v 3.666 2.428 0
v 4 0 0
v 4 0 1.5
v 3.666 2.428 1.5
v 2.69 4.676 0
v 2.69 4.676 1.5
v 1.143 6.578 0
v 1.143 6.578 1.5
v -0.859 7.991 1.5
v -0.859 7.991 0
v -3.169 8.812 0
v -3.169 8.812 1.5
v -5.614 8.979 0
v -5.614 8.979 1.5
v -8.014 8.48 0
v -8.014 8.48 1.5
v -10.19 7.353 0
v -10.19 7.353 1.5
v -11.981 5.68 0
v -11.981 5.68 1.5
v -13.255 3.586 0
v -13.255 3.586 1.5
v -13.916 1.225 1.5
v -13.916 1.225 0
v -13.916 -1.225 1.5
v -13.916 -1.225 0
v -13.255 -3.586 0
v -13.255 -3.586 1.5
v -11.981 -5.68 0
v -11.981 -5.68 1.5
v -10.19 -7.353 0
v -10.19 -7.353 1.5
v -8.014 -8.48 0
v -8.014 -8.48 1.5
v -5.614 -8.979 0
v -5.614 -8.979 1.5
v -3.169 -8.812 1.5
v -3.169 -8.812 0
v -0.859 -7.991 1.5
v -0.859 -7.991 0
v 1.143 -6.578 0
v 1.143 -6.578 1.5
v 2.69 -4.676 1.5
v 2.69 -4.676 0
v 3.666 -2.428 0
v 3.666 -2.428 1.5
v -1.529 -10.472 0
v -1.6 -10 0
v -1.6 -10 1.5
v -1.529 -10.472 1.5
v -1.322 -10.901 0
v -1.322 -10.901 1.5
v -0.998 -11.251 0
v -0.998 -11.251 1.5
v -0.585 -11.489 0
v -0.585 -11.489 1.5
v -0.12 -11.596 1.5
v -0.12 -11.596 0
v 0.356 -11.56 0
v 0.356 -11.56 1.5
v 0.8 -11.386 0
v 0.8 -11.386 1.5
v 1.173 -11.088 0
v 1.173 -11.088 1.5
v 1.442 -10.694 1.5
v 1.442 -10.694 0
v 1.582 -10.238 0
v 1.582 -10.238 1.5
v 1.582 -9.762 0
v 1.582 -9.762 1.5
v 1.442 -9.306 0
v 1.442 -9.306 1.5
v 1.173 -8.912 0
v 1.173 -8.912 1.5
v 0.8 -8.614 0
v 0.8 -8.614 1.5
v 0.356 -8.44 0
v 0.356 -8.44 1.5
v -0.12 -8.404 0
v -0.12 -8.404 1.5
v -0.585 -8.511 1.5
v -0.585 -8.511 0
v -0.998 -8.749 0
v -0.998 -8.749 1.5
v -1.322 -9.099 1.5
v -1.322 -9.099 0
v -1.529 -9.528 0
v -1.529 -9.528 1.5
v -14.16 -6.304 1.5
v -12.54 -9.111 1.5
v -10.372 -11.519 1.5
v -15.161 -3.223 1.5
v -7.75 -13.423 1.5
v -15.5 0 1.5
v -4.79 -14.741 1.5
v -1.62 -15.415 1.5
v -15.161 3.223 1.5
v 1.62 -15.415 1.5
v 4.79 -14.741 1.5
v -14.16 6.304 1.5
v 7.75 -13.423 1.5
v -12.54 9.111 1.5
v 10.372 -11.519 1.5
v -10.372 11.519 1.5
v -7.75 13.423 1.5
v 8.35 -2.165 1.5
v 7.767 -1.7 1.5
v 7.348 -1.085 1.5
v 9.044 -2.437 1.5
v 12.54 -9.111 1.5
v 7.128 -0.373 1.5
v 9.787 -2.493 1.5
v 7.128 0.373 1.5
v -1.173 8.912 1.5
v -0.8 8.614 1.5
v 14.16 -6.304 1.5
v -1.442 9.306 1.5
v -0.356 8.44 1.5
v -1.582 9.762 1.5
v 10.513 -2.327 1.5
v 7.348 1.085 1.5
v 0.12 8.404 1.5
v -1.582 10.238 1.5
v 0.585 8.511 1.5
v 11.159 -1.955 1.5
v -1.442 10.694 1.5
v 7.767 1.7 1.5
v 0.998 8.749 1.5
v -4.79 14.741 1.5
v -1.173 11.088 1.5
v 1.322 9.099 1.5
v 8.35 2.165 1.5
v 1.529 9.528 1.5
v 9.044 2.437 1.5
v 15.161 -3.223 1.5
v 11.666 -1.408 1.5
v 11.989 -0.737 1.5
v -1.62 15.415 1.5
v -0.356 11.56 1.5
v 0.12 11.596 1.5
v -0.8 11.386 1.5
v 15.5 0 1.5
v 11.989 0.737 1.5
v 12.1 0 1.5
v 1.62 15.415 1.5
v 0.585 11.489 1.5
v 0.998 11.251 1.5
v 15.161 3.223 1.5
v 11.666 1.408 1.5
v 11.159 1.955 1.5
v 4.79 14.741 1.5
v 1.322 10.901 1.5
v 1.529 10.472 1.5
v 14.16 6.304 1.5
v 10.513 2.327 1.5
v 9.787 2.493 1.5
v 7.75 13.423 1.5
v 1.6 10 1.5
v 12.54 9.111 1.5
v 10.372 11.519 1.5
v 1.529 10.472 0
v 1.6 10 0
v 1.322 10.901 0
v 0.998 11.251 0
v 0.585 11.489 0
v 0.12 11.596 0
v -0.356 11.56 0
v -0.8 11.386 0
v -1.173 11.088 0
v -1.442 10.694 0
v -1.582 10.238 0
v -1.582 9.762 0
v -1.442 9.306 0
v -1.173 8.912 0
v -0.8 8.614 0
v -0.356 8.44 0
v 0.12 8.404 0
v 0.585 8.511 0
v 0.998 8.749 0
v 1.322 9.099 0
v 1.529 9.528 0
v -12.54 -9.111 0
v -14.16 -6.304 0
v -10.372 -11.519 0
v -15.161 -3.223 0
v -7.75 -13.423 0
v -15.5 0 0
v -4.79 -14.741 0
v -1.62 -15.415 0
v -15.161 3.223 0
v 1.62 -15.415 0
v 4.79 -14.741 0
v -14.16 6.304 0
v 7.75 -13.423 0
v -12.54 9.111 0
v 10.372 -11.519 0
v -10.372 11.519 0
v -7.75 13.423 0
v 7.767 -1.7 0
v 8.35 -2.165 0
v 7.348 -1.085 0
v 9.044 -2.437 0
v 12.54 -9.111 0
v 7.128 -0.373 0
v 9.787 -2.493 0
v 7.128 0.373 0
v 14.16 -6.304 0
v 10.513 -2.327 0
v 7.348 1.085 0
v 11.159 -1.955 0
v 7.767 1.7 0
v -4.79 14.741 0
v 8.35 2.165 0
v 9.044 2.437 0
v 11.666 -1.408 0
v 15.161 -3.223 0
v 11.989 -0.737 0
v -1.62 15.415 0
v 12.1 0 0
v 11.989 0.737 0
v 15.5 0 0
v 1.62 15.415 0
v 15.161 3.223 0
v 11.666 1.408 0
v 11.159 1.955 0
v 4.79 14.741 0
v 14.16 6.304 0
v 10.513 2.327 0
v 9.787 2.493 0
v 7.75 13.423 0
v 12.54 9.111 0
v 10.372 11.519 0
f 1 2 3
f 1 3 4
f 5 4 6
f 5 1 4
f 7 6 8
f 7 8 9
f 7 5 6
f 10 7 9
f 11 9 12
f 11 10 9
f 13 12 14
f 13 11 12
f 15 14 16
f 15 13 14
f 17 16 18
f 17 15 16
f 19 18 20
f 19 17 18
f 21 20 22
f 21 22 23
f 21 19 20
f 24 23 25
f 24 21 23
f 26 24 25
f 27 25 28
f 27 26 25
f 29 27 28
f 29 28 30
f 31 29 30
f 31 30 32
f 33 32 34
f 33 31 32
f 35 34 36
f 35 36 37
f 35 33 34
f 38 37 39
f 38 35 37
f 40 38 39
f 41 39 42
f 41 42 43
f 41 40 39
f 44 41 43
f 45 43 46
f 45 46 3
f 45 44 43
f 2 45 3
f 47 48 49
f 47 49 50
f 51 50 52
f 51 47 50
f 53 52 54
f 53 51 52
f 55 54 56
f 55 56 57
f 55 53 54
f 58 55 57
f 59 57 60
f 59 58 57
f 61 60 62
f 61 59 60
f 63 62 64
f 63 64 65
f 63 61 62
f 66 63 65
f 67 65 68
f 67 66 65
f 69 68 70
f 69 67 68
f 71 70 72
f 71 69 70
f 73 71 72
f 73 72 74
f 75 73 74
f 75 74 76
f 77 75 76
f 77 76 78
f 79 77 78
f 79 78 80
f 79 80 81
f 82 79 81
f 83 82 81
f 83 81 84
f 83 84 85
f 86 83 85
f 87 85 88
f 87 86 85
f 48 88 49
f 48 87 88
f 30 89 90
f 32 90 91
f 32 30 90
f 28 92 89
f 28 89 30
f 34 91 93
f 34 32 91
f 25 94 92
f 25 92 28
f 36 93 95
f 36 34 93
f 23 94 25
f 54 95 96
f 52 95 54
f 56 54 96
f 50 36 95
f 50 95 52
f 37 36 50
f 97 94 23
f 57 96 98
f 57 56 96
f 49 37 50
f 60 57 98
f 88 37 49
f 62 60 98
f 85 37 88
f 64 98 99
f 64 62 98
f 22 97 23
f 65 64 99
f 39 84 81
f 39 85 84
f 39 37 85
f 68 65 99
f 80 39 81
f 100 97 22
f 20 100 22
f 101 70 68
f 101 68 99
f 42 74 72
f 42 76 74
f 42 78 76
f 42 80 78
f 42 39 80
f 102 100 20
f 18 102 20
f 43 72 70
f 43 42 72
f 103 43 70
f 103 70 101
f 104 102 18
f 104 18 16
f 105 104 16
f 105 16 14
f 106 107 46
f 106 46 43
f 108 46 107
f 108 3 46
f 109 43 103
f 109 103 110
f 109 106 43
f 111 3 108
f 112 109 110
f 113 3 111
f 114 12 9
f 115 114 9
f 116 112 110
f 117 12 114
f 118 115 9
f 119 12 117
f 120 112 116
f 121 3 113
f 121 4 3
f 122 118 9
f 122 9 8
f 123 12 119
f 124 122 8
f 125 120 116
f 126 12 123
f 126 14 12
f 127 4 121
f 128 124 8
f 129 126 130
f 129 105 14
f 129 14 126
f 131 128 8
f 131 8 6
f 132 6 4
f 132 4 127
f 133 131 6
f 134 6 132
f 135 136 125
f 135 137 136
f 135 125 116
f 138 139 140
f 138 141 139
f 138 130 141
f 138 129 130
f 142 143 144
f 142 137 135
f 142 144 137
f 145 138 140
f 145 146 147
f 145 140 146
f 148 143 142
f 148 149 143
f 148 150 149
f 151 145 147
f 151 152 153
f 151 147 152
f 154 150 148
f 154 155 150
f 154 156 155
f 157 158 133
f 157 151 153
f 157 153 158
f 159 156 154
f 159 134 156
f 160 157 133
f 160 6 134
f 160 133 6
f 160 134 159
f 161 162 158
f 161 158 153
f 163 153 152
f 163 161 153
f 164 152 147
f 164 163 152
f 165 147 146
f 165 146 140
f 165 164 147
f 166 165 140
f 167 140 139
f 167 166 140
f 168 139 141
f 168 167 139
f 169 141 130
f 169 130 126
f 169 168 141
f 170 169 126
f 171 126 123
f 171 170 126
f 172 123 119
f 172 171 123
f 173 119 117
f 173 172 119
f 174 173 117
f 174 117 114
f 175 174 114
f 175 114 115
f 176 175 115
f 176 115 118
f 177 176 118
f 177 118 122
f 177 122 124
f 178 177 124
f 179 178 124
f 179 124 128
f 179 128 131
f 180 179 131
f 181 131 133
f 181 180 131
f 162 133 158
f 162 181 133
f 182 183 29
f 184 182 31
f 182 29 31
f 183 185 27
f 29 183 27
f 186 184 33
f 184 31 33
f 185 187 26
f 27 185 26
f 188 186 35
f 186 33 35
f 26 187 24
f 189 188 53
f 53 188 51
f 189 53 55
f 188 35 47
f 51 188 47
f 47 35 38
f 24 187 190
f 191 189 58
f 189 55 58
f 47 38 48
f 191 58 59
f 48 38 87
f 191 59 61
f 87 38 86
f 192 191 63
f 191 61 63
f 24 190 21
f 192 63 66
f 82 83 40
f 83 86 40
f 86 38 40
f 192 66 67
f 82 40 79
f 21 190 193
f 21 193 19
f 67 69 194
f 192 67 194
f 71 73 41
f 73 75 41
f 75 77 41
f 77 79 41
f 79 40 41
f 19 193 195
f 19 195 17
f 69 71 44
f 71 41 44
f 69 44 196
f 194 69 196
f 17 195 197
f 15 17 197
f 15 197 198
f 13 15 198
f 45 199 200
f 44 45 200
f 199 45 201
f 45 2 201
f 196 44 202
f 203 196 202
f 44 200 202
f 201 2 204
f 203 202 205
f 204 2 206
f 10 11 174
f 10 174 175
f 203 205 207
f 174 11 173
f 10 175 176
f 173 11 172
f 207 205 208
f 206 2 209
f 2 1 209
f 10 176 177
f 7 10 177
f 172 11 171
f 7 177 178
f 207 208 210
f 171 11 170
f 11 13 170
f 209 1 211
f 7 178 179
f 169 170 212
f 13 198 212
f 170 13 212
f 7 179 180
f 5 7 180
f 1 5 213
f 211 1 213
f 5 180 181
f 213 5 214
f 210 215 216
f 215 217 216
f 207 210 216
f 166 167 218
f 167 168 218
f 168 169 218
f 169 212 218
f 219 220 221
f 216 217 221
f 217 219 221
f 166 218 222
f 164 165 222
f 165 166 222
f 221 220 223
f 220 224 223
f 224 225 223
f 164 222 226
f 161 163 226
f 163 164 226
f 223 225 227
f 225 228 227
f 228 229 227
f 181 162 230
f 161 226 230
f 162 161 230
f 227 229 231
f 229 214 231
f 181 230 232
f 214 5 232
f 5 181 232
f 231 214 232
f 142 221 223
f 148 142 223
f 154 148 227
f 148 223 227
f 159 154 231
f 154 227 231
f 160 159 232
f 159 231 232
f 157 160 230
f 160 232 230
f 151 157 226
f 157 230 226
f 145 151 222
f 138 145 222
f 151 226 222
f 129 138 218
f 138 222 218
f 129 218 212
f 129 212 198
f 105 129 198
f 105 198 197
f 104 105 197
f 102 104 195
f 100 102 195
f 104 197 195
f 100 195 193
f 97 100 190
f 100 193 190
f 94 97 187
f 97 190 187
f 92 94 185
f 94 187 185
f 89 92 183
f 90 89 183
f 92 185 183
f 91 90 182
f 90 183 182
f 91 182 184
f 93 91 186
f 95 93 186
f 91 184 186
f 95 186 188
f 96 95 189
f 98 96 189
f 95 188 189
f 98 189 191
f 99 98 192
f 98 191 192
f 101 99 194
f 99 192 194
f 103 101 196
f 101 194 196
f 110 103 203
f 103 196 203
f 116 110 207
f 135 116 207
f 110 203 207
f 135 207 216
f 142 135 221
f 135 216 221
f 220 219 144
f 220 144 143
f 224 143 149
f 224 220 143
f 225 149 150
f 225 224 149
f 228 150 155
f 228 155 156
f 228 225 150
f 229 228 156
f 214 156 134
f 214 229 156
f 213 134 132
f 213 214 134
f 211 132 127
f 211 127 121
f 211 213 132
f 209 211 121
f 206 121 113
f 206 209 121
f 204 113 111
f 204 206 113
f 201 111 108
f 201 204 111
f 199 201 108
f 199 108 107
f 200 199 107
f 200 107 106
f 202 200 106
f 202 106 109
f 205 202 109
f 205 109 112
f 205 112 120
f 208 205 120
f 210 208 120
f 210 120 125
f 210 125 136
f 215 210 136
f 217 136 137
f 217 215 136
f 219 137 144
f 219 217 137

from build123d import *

# Parameters (mm, degrees)
SKETCH_1_R      = 15.5
SKETCH_1_R_2    = 9
SKETCH_1_R_3    = 2.5
SKETCH_1_R_4    = 1.6
EXTRUDE_1_DEPTH = 1.5


with BuildPart() as part:
    # Эскиз1 → Бобышка-Вытянуть1 (new body)
    with BuildSketch(Plane.XY):
        Circle(SKETCH_1_R)
        with Locations((-5, 0)):
            Circle(SKETCH_1_R_2, mode=Mode.SUBTRACT)
        with Locations((9.6, 0)):
            Circle(SKETCH_1_R_3, mode=Mode.SUBTRACT)
        with Locations((0, 10)):
            Circle(SKETCH_1_R_4, mode=Mode.SUBTRACT)
        with Locations(Location((0, -10, 0), (0, 0, 180))):
            Circle(SKETCH_1_R_4, mode=Mode.SUBTRACT)
    extrude(amount=EXTRUDE_1_DEPTH)


solid = part.part
